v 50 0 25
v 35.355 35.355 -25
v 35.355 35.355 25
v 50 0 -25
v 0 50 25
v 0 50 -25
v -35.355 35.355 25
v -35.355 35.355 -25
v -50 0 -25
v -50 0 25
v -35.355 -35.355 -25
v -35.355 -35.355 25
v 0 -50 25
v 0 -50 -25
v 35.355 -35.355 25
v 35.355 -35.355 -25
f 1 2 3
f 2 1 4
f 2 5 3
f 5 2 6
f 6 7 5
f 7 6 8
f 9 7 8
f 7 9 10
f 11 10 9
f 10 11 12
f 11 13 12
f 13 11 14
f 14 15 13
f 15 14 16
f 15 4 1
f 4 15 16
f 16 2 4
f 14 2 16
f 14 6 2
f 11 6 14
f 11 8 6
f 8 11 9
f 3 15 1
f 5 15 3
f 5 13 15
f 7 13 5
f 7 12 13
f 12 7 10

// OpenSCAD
color("orange")
	cylinder(r=50, h=50, center=true, $fn=8);


		
